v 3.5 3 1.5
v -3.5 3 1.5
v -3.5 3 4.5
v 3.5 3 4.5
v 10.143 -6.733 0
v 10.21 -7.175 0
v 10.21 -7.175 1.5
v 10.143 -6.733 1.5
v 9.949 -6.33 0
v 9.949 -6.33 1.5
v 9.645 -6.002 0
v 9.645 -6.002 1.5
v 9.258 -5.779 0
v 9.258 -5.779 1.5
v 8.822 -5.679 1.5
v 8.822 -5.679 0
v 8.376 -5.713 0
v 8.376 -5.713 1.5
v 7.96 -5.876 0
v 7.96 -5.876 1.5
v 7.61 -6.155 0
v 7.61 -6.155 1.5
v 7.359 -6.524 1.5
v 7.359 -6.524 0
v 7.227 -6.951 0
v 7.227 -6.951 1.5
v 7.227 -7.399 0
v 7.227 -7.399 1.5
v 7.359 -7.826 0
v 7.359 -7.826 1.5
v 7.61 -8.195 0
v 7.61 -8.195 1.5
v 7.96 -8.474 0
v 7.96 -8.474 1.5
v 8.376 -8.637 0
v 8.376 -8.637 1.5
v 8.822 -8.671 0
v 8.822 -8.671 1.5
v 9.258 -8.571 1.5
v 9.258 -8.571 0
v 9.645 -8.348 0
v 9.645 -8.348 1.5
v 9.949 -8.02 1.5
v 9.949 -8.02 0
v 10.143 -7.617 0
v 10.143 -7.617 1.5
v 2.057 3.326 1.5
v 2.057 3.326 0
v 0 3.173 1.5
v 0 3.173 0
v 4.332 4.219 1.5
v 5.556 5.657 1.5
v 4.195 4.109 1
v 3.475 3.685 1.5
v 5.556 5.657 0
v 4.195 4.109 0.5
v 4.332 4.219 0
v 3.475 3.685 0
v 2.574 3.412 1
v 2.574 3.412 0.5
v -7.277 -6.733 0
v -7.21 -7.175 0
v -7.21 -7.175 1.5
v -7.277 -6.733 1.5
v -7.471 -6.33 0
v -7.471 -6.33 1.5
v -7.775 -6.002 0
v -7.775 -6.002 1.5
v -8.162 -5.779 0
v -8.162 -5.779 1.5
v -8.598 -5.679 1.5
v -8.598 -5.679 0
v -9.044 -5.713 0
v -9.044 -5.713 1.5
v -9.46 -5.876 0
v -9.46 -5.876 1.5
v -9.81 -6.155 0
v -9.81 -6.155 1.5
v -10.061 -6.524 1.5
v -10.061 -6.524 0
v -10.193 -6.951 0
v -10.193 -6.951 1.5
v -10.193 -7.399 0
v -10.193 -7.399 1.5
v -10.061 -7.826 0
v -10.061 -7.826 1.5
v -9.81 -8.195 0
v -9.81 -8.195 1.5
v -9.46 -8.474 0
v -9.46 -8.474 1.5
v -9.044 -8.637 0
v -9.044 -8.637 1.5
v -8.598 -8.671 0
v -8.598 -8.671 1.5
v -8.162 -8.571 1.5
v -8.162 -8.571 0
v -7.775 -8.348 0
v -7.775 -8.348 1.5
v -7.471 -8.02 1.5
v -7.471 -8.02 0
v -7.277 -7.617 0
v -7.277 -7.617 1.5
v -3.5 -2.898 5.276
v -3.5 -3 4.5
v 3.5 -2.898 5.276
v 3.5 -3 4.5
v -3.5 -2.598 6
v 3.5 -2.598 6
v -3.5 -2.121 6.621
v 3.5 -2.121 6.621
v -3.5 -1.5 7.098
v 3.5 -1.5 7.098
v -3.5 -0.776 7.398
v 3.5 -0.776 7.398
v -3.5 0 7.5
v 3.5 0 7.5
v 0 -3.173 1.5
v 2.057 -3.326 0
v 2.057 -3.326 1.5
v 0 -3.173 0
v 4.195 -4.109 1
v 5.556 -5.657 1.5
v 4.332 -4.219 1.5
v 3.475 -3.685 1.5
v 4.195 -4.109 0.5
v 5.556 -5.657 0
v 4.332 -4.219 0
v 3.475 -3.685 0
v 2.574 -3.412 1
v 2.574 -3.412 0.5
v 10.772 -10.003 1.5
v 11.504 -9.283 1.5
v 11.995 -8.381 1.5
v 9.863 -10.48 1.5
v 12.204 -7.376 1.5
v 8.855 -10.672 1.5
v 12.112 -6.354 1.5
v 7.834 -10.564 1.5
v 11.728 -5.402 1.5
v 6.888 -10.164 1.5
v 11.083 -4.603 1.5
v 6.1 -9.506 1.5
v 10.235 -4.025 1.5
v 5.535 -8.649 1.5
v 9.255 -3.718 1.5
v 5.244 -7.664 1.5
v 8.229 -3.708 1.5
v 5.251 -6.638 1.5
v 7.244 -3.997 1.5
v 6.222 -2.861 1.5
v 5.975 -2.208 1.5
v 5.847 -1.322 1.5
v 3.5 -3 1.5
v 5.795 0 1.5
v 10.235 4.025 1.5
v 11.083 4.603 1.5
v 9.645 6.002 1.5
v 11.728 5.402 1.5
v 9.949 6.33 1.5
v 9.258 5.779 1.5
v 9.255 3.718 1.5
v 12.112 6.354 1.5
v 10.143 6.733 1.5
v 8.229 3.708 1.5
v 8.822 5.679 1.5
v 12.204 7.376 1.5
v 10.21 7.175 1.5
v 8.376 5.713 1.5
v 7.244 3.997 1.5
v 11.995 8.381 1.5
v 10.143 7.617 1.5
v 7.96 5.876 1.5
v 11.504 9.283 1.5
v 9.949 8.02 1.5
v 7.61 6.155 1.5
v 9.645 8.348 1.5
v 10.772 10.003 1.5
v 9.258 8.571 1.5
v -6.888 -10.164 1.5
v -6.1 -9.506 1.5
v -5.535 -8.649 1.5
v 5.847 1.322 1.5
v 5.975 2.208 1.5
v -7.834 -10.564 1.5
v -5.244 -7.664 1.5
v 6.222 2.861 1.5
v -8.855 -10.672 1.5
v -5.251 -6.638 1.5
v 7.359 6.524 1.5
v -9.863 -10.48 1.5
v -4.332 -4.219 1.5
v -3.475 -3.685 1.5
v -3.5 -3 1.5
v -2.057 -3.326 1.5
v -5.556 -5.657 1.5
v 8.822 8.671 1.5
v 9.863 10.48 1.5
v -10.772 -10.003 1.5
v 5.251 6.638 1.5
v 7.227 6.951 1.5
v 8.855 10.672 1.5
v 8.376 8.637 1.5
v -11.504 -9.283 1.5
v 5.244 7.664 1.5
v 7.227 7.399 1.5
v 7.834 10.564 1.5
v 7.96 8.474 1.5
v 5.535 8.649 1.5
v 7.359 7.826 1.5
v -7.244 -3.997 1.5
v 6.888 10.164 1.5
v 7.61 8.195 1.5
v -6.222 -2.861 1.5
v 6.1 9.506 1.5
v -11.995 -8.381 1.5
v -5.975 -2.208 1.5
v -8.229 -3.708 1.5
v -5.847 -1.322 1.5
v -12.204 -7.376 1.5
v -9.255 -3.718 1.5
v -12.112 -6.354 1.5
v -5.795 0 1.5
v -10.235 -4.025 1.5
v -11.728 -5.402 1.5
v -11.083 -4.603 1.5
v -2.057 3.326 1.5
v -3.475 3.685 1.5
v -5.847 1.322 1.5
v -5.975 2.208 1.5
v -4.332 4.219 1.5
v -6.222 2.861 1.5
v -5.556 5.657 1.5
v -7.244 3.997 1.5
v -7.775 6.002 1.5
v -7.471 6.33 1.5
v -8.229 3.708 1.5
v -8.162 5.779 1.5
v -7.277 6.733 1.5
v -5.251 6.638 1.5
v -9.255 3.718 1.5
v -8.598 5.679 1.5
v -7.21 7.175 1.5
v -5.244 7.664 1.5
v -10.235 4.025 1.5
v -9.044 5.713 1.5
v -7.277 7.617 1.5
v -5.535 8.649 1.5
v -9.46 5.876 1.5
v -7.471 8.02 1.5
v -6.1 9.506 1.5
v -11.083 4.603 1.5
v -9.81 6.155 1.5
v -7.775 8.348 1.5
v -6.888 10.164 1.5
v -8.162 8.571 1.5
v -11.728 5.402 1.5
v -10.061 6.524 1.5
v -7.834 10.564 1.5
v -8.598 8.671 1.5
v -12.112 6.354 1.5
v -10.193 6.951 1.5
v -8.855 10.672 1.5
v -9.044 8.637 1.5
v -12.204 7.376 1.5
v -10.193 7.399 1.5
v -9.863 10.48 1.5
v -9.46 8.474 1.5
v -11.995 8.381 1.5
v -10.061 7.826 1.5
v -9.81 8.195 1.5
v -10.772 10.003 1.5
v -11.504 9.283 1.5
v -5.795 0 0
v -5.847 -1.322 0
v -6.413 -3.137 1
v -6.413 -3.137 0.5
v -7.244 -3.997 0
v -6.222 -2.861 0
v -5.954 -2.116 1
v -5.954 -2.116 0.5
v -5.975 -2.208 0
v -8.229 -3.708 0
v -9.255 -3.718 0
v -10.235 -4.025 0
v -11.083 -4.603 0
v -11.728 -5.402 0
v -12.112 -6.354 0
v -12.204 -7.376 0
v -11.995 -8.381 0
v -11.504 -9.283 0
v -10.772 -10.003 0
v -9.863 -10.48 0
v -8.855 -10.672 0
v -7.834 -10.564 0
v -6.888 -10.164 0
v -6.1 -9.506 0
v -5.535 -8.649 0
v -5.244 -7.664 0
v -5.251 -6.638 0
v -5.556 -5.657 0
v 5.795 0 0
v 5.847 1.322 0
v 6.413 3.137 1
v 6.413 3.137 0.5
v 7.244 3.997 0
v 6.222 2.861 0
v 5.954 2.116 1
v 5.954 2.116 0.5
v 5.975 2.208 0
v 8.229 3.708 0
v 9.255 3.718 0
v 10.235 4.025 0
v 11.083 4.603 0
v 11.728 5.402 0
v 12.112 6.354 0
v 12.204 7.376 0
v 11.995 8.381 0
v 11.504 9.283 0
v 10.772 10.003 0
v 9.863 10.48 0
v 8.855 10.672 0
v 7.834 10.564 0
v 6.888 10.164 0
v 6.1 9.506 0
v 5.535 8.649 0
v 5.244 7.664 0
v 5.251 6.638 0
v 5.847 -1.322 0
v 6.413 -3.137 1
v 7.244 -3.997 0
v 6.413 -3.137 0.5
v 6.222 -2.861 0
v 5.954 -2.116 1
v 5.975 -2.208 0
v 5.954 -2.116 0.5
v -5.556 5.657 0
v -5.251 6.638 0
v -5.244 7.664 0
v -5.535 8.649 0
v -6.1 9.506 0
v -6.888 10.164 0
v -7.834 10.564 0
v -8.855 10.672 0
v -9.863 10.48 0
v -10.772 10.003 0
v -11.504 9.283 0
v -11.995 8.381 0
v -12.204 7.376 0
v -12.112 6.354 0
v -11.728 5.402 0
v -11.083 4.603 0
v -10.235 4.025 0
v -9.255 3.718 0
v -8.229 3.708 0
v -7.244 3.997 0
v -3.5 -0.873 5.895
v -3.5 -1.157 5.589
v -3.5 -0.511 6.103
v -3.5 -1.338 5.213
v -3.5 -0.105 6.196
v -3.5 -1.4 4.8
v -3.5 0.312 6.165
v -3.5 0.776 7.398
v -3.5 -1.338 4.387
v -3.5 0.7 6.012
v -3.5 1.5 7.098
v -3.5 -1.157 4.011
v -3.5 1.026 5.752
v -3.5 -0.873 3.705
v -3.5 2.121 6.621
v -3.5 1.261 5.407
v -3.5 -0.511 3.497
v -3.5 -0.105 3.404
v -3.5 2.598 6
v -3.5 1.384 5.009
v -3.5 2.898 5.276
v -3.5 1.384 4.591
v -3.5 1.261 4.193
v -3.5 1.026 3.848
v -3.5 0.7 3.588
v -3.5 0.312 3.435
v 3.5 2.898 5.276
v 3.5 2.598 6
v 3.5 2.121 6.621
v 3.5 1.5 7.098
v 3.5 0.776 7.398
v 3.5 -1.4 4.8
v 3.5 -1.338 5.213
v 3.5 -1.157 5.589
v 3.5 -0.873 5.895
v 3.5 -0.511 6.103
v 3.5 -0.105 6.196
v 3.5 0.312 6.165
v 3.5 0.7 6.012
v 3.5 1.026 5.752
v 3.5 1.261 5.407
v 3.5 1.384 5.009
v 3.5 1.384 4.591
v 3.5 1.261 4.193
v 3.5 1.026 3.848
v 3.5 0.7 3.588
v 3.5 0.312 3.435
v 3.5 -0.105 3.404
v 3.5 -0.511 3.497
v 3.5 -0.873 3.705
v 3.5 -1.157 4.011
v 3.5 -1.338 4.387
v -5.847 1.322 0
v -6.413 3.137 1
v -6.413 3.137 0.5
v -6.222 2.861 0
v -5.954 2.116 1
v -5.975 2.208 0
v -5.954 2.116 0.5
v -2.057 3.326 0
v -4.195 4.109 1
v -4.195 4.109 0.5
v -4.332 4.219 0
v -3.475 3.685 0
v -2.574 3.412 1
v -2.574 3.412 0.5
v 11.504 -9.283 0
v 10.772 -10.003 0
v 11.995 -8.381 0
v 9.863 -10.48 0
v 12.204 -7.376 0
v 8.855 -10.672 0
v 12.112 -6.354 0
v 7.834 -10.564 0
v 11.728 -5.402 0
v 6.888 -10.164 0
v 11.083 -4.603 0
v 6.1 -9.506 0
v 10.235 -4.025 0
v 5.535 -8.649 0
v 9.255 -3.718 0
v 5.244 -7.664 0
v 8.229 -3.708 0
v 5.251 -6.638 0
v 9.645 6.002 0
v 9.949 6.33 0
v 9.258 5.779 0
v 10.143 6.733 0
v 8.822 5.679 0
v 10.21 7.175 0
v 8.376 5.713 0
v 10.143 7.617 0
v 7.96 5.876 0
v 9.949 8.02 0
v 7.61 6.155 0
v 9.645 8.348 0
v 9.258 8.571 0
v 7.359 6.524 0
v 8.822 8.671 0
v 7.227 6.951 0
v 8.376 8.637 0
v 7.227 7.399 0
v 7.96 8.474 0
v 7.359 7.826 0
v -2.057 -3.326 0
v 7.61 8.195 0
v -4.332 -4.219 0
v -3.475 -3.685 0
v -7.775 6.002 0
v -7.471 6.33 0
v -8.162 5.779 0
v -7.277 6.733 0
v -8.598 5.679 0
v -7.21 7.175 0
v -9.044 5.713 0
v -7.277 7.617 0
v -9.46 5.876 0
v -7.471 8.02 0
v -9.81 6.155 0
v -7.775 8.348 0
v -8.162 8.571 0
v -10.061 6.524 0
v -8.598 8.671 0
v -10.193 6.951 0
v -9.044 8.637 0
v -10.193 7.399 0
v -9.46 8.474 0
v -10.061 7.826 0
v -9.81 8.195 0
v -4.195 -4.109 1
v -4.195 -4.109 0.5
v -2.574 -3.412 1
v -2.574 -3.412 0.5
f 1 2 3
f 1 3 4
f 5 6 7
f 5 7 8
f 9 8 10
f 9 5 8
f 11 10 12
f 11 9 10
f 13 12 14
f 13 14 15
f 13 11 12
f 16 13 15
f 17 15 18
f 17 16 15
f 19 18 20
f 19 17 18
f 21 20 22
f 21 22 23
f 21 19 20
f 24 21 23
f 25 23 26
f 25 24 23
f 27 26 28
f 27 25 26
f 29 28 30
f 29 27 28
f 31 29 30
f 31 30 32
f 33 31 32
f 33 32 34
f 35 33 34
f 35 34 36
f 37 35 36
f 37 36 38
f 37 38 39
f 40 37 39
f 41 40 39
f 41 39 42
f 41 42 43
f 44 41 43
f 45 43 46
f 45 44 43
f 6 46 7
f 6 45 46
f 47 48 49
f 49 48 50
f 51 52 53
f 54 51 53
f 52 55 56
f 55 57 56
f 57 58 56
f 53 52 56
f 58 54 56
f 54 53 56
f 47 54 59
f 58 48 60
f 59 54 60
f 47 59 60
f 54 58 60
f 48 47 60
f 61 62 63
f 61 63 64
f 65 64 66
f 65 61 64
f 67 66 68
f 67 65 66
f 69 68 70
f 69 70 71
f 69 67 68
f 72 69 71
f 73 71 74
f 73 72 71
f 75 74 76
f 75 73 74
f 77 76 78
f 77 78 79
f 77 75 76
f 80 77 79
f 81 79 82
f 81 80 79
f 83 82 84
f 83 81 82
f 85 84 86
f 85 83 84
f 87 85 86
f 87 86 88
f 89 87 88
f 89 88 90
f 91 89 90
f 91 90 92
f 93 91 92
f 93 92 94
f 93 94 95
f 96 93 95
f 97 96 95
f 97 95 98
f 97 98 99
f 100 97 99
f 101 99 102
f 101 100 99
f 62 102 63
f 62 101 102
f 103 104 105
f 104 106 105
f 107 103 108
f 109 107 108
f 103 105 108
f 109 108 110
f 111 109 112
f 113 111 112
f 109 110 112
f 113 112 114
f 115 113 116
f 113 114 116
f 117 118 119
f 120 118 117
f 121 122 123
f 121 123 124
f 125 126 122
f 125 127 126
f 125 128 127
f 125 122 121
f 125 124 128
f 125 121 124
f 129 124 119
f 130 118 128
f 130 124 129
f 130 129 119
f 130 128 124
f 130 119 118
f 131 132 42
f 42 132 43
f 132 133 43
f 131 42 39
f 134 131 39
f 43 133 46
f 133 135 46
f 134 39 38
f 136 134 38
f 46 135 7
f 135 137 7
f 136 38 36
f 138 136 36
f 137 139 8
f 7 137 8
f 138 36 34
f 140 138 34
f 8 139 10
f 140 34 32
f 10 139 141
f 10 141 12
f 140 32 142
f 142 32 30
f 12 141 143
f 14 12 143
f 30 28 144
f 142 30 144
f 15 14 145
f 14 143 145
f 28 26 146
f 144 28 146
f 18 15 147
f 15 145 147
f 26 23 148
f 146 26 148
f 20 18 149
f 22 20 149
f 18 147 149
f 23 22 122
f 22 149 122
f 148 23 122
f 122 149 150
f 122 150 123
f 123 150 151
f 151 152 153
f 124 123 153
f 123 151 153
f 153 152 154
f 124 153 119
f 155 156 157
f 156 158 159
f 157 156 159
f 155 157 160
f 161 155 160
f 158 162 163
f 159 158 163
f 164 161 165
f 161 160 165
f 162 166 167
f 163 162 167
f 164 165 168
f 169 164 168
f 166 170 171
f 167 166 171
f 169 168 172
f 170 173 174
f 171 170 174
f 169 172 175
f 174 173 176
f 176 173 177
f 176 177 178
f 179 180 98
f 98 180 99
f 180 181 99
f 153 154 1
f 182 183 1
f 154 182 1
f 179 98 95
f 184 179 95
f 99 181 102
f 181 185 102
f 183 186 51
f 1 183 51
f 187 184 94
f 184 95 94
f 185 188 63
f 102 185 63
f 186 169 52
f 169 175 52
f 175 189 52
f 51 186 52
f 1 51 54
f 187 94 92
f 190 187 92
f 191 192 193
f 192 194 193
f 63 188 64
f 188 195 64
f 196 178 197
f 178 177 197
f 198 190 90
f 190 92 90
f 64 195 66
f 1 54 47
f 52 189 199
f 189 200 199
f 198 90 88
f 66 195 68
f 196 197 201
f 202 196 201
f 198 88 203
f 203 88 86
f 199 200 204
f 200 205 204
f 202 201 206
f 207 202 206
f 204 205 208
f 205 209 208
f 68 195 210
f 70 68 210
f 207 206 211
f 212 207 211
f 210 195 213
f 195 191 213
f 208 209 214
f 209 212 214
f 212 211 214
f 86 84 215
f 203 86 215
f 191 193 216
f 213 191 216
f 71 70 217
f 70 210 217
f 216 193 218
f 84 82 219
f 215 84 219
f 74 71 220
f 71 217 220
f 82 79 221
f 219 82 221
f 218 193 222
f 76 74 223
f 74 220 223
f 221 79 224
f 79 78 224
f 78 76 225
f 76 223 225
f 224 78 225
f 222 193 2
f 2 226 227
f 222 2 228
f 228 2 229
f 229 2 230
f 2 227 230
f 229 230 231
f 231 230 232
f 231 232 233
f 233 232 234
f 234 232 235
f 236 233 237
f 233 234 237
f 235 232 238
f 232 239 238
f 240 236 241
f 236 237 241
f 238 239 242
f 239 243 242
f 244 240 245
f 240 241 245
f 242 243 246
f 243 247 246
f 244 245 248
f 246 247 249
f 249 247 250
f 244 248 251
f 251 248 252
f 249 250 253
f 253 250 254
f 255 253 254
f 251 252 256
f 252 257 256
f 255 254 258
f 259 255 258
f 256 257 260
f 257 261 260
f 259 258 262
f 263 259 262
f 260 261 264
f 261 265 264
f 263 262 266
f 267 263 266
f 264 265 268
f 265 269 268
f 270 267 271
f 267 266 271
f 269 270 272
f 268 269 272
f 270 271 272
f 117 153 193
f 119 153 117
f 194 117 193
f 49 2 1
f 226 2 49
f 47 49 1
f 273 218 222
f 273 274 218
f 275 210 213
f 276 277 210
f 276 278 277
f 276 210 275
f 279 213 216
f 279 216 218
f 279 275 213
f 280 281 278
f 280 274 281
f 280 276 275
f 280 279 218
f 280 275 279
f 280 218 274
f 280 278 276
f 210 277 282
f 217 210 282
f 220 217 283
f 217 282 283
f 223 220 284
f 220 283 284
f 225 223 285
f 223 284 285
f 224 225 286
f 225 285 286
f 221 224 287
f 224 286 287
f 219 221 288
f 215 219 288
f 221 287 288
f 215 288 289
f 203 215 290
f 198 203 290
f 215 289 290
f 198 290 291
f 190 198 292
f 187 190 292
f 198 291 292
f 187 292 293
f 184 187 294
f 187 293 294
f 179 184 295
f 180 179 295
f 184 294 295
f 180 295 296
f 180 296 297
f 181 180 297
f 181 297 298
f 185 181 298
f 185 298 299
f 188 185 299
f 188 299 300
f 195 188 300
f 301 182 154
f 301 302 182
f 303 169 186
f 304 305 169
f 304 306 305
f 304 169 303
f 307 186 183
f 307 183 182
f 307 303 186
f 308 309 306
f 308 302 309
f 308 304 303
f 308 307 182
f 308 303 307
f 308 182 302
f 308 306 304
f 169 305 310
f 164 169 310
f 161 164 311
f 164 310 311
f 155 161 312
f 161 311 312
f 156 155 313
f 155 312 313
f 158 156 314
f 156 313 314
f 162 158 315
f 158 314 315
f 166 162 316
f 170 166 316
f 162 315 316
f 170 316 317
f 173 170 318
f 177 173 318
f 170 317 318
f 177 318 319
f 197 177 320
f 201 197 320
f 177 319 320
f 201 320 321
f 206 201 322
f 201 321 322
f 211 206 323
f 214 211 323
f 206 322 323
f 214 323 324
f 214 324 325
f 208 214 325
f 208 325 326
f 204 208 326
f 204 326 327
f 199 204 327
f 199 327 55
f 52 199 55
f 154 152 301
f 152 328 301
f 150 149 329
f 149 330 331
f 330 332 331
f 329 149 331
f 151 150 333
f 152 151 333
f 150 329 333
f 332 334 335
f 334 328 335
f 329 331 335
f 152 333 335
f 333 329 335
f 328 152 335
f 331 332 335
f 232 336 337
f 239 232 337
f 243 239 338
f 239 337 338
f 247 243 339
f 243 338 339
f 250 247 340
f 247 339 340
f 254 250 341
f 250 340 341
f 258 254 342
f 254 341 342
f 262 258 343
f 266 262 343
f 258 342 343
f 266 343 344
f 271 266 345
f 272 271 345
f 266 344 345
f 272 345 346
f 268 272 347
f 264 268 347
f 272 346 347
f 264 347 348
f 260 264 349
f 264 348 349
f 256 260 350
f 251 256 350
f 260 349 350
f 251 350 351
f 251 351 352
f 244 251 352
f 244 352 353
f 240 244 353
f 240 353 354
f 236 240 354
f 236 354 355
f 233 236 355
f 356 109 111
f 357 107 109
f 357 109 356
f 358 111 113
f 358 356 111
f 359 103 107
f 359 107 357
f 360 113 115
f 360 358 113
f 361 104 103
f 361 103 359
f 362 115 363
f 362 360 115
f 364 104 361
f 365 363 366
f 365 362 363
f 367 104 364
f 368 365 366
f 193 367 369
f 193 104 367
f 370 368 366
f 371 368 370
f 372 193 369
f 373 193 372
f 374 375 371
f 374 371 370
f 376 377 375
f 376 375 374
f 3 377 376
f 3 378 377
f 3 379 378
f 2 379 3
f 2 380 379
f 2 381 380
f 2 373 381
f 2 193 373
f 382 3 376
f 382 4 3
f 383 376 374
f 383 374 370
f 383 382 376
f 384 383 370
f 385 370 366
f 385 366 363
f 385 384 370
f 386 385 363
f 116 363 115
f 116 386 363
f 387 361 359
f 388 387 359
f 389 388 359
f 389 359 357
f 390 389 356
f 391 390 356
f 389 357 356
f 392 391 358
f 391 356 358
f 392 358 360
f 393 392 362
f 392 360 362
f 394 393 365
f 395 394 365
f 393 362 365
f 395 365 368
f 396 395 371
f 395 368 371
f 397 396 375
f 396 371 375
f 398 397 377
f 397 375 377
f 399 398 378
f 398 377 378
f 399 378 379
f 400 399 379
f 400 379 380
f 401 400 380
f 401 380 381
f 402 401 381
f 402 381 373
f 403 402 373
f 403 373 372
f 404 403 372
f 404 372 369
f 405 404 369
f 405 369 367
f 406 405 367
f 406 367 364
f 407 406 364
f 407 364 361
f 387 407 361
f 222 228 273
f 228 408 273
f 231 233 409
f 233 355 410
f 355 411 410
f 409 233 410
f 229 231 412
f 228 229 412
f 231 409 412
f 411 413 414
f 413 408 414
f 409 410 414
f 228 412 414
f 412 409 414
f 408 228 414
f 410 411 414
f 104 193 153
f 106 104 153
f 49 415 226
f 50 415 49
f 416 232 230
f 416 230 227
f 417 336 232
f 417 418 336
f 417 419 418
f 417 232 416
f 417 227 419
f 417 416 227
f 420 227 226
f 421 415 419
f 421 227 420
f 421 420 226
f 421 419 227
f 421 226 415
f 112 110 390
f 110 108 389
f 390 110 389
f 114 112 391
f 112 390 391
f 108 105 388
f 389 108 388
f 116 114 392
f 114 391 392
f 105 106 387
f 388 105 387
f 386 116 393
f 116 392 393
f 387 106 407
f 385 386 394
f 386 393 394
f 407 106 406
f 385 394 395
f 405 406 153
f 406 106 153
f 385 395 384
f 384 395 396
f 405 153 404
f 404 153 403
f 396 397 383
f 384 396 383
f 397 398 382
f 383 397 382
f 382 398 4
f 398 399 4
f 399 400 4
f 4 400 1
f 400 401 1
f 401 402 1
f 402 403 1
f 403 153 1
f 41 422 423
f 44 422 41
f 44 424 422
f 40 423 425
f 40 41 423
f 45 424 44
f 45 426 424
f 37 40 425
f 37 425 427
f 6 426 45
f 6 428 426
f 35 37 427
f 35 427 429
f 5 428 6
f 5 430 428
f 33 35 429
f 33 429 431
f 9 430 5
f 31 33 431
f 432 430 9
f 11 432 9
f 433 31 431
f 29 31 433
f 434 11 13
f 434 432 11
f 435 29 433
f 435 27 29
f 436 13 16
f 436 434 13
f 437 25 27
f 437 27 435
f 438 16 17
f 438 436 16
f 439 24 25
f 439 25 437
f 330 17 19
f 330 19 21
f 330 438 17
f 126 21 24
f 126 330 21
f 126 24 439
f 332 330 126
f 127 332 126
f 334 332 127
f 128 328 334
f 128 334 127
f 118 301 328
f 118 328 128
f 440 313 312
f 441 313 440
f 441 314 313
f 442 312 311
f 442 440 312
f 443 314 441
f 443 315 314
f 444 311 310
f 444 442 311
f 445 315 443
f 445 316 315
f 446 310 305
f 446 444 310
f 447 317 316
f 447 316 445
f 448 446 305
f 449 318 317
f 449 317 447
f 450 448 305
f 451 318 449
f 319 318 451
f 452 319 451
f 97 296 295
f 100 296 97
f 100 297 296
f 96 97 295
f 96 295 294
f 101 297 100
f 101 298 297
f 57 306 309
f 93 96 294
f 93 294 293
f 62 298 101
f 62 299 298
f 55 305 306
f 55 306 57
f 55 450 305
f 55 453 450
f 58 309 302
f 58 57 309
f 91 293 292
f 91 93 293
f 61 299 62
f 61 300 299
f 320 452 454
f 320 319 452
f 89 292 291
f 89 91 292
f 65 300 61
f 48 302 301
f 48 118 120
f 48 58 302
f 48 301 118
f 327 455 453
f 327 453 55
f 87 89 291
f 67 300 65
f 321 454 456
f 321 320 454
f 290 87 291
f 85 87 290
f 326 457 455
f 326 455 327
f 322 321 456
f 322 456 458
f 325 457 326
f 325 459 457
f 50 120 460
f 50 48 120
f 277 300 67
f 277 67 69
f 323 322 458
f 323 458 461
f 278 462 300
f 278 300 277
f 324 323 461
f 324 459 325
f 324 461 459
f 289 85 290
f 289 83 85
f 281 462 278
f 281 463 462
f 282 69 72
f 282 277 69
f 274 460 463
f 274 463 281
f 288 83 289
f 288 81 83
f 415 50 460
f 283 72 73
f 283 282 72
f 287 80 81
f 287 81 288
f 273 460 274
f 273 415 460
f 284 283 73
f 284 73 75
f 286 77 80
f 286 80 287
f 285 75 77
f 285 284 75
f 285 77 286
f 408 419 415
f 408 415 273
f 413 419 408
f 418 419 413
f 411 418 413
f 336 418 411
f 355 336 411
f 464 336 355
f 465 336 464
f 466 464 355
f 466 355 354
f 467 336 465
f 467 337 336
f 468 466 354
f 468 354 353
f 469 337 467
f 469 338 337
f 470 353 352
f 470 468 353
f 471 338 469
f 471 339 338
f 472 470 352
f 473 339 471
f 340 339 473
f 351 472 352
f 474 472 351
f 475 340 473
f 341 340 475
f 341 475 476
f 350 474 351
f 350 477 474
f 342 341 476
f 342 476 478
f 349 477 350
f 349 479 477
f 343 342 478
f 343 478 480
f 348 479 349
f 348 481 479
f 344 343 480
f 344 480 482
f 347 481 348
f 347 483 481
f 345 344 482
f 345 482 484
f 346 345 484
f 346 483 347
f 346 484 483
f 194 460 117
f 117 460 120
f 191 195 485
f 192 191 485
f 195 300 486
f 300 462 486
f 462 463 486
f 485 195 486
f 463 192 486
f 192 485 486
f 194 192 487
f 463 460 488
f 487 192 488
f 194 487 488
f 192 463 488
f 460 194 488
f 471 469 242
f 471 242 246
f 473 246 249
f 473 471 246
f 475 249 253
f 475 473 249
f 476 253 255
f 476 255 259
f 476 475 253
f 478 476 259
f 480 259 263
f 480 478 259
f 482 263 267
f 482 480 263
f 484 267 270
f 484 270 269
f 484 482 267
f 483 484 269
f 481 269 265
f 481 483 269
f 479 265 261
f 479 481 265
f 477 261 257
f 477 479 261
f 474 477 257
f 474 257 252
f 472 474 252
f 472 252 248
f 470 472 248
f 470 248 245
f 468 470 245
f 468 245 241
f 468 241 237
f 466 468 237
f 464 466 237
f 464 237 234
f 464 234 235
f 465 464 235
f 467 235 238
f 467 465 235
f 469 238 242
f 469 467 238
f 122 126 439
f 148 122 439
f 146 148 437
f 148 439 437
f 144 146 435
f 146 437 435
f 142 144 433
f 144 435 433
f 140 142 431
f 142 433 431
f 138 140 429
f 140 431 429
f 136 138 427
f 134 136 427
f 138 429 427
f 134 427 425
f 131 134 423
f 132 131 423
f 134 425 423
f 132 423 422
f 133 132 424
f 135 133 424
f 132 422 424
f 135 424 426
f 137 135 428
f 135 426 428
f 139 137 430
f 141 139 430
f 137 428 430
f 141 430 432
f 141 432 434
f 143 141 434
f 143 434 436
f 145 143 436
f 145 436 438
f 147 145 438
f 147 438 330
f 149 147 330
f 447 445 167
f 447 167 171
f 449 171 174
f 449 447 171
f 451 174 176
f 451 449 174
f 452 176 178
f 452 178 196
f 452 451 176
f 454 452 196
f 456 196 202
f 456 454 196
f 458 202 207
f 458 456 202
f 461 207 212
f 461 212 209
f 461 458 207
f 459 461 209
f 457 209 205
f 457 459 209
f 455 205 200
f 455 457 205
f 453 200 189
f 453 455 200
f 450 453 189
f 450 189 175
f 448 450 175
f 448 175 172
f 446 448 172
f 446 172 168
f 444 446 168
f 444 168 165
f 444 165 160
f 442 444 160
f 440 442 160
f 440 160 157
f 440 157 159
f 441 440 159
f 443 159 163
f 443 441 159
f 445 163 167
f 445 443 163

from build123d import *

# Parameters (mm, degrees)
F0_R     = 1.5
F0_W     = 7
F0_H     = 6
F1_DEPTH = 1.5
F2_DEPTH = 7.5
F3_R     = 1.4
F4_DEPTH = 25
F5_R     = 2.99999


# Not quite as in the source:
# - a fillet or chamfer is up to 0.001 mm smaller than in the source, because OpenCascade refuses the exact size


with BuildPart() as f1:
    # F0 (on Top) → F1 (new body)
    with BuildSketch(Plane.XY):
        with BuildLine():
            add(Edge.make_bspline(
                [(-5.5561550838, 5.6573497621), (-4.0955413133, 3.5522743128), (-3.2797986642, 3.3143495675), (0, 3.173440462)],
                knots=[0, 0, 0, 0, 6.0861042323, 6.0861042323, 6.0861042323, 6.0861042323], degree=3))
            ThreePointArc((-5.5561550838, 5.6573497621), (-11.1647533144, 9.6698318912), (-7.2436210565, 3.9969923231))
            add(Edge.make_bspline(
                [(-7.2436210565, 3.9969923231), (-6.2028751709, 2.9064782429), (-5.828993395, 2.9744568747), (-5.7950043119, 0)],
                knots=[0, 0, 0, 0, 4.2514042508, 4.2514042508, 4.2514042508, 4.2514042508], degree=3))
            add(Edge.make_bspline(
                [(-7.2436210565, -3.9969923231), (-6.2028751709, -2.9064782429), (-5.828993395, -2.9744568747), (-5.7950043119, 0)],
                knots=[0, 0, 0, 0, 4.2514042508, 4.2514042508, 4.2514042508, 4.2514042508], degree=3))
            ThreePointArc((-7.2436210565, -3.9969923231), (-11.1647533144, -9.6698318912), (-5.5561550838, -5.6573497621))
            add(Edge.make_bspline(
                [(-5.5561550838, -5.6573497621), (-4.0955413133, -3.5522743128), (-3.2797986642, -3.3143495675), (0, -3.173440462)],
                knots=[0, 0, 0, 0, 6.0861042323, 6.0861042323, 6.0861042323, 6.0861042323], degree=3))
            add(Edge.make_bspline(
                [(5.5561550838, -5.6573497621), (4.0955413133, -3.5522743128), (3.2797986642, -3.3143495675), (0, -3.173440462)],
                knots=[0, 0, 0, 0, 6.0861042323, 6.0861042323, 6.0861042323, 6.0861042323], degree=3))
            ThreePointArc((5.5561550838, -5.6573497621), (11.1647533144, -9.6698318912), (7.2436210565, -3.9969923231))
            add(Edge.make_bspline(
                [(7.2436210565, -3.9969923231), (6.2028751709, -2.9064782429), (5.828993395, -2.9744568747), (5.7950043119, 0)],
                knots=[0, 0, 0, 0, 4.2514042508, 4.2514042508, 4.2514042508, 4.2514042508], degree=3))
            add(Edge.make_bspline(
                [(7.2436210565, 3.9969923231), (6.2028751709, 2.9064782429), (5.828993395, 2.9744568747), (5.7950043119, 0)],
                knots=[0, 0, 0, 0, 4.2514042508, 4.2514042508, 4.2514042508, 4.2514042508], degree=3))
            ThreePointArc((7.2436210565, 3.9969923231), (11.1647533144, 9.6698318912), (5.5561550838, 5.6573497621))
            add(Edge.make_bspline(
                [(5.5561550838, 5.6573497621), (4.0955413133, 3.5522743128), (3.2797986642, 3.3143495675), (0, 3.173440462)],
                knots=[0, 0, 0, 0, 6.0861042323, 6.0861042323, 6.0861042323, 6.0861042323], degree=3))
        make_face()
        with Locations((-8.71, -7.175)):
            Circle(F0_R, mode=Mode.SUBTRACT)
        with Locations((8.71, -7.175)):
            Circle(F0_R, mode=Mode.SUBTRACT)
        with Locations((-8.71, 7.175)):
            Circle(F0_R, mode=Mode.SUBTRACT)
        Rectangle(F0_W, F0_H, mode=Mode.SUBTRACT)
        with Locations((8.71, 7.175)):
            Circle(F0_R, mode=Mode.SUBTRACT)
    extrude(amount=F1_DEPTH)

    # F0 (on Top) → F2 (join)
    with BuildSketch(Plane.XY):
        Rectangle(F0_W, F0_H)
    extrude(amount=F2_DEPTH)

    # F3 (on face) → F4 (cut)
    with BuildSketch(Plane(origin=(-3.5, 0, 0), x_dir=(0, -1, 0), z_dir=(-1, 0, 0))):
        with Locations((0, 4.8)):
            Circle(F3_R)
    extrude(amount=-F4_DEPTH, mode=Mode.SUBTRACT)

    # F5 (radius 3 in the source; OpenCascade refuses exactly that, so slightly less here)
    f5_edges = [f1.edges().sort_by_distance(p)[0] for p in [
        (0, 3, 7.5),
        (0, -3, 7.5),
    ]]
    fillet(f5_edges, radius=F5_R)


solid = f1.part
